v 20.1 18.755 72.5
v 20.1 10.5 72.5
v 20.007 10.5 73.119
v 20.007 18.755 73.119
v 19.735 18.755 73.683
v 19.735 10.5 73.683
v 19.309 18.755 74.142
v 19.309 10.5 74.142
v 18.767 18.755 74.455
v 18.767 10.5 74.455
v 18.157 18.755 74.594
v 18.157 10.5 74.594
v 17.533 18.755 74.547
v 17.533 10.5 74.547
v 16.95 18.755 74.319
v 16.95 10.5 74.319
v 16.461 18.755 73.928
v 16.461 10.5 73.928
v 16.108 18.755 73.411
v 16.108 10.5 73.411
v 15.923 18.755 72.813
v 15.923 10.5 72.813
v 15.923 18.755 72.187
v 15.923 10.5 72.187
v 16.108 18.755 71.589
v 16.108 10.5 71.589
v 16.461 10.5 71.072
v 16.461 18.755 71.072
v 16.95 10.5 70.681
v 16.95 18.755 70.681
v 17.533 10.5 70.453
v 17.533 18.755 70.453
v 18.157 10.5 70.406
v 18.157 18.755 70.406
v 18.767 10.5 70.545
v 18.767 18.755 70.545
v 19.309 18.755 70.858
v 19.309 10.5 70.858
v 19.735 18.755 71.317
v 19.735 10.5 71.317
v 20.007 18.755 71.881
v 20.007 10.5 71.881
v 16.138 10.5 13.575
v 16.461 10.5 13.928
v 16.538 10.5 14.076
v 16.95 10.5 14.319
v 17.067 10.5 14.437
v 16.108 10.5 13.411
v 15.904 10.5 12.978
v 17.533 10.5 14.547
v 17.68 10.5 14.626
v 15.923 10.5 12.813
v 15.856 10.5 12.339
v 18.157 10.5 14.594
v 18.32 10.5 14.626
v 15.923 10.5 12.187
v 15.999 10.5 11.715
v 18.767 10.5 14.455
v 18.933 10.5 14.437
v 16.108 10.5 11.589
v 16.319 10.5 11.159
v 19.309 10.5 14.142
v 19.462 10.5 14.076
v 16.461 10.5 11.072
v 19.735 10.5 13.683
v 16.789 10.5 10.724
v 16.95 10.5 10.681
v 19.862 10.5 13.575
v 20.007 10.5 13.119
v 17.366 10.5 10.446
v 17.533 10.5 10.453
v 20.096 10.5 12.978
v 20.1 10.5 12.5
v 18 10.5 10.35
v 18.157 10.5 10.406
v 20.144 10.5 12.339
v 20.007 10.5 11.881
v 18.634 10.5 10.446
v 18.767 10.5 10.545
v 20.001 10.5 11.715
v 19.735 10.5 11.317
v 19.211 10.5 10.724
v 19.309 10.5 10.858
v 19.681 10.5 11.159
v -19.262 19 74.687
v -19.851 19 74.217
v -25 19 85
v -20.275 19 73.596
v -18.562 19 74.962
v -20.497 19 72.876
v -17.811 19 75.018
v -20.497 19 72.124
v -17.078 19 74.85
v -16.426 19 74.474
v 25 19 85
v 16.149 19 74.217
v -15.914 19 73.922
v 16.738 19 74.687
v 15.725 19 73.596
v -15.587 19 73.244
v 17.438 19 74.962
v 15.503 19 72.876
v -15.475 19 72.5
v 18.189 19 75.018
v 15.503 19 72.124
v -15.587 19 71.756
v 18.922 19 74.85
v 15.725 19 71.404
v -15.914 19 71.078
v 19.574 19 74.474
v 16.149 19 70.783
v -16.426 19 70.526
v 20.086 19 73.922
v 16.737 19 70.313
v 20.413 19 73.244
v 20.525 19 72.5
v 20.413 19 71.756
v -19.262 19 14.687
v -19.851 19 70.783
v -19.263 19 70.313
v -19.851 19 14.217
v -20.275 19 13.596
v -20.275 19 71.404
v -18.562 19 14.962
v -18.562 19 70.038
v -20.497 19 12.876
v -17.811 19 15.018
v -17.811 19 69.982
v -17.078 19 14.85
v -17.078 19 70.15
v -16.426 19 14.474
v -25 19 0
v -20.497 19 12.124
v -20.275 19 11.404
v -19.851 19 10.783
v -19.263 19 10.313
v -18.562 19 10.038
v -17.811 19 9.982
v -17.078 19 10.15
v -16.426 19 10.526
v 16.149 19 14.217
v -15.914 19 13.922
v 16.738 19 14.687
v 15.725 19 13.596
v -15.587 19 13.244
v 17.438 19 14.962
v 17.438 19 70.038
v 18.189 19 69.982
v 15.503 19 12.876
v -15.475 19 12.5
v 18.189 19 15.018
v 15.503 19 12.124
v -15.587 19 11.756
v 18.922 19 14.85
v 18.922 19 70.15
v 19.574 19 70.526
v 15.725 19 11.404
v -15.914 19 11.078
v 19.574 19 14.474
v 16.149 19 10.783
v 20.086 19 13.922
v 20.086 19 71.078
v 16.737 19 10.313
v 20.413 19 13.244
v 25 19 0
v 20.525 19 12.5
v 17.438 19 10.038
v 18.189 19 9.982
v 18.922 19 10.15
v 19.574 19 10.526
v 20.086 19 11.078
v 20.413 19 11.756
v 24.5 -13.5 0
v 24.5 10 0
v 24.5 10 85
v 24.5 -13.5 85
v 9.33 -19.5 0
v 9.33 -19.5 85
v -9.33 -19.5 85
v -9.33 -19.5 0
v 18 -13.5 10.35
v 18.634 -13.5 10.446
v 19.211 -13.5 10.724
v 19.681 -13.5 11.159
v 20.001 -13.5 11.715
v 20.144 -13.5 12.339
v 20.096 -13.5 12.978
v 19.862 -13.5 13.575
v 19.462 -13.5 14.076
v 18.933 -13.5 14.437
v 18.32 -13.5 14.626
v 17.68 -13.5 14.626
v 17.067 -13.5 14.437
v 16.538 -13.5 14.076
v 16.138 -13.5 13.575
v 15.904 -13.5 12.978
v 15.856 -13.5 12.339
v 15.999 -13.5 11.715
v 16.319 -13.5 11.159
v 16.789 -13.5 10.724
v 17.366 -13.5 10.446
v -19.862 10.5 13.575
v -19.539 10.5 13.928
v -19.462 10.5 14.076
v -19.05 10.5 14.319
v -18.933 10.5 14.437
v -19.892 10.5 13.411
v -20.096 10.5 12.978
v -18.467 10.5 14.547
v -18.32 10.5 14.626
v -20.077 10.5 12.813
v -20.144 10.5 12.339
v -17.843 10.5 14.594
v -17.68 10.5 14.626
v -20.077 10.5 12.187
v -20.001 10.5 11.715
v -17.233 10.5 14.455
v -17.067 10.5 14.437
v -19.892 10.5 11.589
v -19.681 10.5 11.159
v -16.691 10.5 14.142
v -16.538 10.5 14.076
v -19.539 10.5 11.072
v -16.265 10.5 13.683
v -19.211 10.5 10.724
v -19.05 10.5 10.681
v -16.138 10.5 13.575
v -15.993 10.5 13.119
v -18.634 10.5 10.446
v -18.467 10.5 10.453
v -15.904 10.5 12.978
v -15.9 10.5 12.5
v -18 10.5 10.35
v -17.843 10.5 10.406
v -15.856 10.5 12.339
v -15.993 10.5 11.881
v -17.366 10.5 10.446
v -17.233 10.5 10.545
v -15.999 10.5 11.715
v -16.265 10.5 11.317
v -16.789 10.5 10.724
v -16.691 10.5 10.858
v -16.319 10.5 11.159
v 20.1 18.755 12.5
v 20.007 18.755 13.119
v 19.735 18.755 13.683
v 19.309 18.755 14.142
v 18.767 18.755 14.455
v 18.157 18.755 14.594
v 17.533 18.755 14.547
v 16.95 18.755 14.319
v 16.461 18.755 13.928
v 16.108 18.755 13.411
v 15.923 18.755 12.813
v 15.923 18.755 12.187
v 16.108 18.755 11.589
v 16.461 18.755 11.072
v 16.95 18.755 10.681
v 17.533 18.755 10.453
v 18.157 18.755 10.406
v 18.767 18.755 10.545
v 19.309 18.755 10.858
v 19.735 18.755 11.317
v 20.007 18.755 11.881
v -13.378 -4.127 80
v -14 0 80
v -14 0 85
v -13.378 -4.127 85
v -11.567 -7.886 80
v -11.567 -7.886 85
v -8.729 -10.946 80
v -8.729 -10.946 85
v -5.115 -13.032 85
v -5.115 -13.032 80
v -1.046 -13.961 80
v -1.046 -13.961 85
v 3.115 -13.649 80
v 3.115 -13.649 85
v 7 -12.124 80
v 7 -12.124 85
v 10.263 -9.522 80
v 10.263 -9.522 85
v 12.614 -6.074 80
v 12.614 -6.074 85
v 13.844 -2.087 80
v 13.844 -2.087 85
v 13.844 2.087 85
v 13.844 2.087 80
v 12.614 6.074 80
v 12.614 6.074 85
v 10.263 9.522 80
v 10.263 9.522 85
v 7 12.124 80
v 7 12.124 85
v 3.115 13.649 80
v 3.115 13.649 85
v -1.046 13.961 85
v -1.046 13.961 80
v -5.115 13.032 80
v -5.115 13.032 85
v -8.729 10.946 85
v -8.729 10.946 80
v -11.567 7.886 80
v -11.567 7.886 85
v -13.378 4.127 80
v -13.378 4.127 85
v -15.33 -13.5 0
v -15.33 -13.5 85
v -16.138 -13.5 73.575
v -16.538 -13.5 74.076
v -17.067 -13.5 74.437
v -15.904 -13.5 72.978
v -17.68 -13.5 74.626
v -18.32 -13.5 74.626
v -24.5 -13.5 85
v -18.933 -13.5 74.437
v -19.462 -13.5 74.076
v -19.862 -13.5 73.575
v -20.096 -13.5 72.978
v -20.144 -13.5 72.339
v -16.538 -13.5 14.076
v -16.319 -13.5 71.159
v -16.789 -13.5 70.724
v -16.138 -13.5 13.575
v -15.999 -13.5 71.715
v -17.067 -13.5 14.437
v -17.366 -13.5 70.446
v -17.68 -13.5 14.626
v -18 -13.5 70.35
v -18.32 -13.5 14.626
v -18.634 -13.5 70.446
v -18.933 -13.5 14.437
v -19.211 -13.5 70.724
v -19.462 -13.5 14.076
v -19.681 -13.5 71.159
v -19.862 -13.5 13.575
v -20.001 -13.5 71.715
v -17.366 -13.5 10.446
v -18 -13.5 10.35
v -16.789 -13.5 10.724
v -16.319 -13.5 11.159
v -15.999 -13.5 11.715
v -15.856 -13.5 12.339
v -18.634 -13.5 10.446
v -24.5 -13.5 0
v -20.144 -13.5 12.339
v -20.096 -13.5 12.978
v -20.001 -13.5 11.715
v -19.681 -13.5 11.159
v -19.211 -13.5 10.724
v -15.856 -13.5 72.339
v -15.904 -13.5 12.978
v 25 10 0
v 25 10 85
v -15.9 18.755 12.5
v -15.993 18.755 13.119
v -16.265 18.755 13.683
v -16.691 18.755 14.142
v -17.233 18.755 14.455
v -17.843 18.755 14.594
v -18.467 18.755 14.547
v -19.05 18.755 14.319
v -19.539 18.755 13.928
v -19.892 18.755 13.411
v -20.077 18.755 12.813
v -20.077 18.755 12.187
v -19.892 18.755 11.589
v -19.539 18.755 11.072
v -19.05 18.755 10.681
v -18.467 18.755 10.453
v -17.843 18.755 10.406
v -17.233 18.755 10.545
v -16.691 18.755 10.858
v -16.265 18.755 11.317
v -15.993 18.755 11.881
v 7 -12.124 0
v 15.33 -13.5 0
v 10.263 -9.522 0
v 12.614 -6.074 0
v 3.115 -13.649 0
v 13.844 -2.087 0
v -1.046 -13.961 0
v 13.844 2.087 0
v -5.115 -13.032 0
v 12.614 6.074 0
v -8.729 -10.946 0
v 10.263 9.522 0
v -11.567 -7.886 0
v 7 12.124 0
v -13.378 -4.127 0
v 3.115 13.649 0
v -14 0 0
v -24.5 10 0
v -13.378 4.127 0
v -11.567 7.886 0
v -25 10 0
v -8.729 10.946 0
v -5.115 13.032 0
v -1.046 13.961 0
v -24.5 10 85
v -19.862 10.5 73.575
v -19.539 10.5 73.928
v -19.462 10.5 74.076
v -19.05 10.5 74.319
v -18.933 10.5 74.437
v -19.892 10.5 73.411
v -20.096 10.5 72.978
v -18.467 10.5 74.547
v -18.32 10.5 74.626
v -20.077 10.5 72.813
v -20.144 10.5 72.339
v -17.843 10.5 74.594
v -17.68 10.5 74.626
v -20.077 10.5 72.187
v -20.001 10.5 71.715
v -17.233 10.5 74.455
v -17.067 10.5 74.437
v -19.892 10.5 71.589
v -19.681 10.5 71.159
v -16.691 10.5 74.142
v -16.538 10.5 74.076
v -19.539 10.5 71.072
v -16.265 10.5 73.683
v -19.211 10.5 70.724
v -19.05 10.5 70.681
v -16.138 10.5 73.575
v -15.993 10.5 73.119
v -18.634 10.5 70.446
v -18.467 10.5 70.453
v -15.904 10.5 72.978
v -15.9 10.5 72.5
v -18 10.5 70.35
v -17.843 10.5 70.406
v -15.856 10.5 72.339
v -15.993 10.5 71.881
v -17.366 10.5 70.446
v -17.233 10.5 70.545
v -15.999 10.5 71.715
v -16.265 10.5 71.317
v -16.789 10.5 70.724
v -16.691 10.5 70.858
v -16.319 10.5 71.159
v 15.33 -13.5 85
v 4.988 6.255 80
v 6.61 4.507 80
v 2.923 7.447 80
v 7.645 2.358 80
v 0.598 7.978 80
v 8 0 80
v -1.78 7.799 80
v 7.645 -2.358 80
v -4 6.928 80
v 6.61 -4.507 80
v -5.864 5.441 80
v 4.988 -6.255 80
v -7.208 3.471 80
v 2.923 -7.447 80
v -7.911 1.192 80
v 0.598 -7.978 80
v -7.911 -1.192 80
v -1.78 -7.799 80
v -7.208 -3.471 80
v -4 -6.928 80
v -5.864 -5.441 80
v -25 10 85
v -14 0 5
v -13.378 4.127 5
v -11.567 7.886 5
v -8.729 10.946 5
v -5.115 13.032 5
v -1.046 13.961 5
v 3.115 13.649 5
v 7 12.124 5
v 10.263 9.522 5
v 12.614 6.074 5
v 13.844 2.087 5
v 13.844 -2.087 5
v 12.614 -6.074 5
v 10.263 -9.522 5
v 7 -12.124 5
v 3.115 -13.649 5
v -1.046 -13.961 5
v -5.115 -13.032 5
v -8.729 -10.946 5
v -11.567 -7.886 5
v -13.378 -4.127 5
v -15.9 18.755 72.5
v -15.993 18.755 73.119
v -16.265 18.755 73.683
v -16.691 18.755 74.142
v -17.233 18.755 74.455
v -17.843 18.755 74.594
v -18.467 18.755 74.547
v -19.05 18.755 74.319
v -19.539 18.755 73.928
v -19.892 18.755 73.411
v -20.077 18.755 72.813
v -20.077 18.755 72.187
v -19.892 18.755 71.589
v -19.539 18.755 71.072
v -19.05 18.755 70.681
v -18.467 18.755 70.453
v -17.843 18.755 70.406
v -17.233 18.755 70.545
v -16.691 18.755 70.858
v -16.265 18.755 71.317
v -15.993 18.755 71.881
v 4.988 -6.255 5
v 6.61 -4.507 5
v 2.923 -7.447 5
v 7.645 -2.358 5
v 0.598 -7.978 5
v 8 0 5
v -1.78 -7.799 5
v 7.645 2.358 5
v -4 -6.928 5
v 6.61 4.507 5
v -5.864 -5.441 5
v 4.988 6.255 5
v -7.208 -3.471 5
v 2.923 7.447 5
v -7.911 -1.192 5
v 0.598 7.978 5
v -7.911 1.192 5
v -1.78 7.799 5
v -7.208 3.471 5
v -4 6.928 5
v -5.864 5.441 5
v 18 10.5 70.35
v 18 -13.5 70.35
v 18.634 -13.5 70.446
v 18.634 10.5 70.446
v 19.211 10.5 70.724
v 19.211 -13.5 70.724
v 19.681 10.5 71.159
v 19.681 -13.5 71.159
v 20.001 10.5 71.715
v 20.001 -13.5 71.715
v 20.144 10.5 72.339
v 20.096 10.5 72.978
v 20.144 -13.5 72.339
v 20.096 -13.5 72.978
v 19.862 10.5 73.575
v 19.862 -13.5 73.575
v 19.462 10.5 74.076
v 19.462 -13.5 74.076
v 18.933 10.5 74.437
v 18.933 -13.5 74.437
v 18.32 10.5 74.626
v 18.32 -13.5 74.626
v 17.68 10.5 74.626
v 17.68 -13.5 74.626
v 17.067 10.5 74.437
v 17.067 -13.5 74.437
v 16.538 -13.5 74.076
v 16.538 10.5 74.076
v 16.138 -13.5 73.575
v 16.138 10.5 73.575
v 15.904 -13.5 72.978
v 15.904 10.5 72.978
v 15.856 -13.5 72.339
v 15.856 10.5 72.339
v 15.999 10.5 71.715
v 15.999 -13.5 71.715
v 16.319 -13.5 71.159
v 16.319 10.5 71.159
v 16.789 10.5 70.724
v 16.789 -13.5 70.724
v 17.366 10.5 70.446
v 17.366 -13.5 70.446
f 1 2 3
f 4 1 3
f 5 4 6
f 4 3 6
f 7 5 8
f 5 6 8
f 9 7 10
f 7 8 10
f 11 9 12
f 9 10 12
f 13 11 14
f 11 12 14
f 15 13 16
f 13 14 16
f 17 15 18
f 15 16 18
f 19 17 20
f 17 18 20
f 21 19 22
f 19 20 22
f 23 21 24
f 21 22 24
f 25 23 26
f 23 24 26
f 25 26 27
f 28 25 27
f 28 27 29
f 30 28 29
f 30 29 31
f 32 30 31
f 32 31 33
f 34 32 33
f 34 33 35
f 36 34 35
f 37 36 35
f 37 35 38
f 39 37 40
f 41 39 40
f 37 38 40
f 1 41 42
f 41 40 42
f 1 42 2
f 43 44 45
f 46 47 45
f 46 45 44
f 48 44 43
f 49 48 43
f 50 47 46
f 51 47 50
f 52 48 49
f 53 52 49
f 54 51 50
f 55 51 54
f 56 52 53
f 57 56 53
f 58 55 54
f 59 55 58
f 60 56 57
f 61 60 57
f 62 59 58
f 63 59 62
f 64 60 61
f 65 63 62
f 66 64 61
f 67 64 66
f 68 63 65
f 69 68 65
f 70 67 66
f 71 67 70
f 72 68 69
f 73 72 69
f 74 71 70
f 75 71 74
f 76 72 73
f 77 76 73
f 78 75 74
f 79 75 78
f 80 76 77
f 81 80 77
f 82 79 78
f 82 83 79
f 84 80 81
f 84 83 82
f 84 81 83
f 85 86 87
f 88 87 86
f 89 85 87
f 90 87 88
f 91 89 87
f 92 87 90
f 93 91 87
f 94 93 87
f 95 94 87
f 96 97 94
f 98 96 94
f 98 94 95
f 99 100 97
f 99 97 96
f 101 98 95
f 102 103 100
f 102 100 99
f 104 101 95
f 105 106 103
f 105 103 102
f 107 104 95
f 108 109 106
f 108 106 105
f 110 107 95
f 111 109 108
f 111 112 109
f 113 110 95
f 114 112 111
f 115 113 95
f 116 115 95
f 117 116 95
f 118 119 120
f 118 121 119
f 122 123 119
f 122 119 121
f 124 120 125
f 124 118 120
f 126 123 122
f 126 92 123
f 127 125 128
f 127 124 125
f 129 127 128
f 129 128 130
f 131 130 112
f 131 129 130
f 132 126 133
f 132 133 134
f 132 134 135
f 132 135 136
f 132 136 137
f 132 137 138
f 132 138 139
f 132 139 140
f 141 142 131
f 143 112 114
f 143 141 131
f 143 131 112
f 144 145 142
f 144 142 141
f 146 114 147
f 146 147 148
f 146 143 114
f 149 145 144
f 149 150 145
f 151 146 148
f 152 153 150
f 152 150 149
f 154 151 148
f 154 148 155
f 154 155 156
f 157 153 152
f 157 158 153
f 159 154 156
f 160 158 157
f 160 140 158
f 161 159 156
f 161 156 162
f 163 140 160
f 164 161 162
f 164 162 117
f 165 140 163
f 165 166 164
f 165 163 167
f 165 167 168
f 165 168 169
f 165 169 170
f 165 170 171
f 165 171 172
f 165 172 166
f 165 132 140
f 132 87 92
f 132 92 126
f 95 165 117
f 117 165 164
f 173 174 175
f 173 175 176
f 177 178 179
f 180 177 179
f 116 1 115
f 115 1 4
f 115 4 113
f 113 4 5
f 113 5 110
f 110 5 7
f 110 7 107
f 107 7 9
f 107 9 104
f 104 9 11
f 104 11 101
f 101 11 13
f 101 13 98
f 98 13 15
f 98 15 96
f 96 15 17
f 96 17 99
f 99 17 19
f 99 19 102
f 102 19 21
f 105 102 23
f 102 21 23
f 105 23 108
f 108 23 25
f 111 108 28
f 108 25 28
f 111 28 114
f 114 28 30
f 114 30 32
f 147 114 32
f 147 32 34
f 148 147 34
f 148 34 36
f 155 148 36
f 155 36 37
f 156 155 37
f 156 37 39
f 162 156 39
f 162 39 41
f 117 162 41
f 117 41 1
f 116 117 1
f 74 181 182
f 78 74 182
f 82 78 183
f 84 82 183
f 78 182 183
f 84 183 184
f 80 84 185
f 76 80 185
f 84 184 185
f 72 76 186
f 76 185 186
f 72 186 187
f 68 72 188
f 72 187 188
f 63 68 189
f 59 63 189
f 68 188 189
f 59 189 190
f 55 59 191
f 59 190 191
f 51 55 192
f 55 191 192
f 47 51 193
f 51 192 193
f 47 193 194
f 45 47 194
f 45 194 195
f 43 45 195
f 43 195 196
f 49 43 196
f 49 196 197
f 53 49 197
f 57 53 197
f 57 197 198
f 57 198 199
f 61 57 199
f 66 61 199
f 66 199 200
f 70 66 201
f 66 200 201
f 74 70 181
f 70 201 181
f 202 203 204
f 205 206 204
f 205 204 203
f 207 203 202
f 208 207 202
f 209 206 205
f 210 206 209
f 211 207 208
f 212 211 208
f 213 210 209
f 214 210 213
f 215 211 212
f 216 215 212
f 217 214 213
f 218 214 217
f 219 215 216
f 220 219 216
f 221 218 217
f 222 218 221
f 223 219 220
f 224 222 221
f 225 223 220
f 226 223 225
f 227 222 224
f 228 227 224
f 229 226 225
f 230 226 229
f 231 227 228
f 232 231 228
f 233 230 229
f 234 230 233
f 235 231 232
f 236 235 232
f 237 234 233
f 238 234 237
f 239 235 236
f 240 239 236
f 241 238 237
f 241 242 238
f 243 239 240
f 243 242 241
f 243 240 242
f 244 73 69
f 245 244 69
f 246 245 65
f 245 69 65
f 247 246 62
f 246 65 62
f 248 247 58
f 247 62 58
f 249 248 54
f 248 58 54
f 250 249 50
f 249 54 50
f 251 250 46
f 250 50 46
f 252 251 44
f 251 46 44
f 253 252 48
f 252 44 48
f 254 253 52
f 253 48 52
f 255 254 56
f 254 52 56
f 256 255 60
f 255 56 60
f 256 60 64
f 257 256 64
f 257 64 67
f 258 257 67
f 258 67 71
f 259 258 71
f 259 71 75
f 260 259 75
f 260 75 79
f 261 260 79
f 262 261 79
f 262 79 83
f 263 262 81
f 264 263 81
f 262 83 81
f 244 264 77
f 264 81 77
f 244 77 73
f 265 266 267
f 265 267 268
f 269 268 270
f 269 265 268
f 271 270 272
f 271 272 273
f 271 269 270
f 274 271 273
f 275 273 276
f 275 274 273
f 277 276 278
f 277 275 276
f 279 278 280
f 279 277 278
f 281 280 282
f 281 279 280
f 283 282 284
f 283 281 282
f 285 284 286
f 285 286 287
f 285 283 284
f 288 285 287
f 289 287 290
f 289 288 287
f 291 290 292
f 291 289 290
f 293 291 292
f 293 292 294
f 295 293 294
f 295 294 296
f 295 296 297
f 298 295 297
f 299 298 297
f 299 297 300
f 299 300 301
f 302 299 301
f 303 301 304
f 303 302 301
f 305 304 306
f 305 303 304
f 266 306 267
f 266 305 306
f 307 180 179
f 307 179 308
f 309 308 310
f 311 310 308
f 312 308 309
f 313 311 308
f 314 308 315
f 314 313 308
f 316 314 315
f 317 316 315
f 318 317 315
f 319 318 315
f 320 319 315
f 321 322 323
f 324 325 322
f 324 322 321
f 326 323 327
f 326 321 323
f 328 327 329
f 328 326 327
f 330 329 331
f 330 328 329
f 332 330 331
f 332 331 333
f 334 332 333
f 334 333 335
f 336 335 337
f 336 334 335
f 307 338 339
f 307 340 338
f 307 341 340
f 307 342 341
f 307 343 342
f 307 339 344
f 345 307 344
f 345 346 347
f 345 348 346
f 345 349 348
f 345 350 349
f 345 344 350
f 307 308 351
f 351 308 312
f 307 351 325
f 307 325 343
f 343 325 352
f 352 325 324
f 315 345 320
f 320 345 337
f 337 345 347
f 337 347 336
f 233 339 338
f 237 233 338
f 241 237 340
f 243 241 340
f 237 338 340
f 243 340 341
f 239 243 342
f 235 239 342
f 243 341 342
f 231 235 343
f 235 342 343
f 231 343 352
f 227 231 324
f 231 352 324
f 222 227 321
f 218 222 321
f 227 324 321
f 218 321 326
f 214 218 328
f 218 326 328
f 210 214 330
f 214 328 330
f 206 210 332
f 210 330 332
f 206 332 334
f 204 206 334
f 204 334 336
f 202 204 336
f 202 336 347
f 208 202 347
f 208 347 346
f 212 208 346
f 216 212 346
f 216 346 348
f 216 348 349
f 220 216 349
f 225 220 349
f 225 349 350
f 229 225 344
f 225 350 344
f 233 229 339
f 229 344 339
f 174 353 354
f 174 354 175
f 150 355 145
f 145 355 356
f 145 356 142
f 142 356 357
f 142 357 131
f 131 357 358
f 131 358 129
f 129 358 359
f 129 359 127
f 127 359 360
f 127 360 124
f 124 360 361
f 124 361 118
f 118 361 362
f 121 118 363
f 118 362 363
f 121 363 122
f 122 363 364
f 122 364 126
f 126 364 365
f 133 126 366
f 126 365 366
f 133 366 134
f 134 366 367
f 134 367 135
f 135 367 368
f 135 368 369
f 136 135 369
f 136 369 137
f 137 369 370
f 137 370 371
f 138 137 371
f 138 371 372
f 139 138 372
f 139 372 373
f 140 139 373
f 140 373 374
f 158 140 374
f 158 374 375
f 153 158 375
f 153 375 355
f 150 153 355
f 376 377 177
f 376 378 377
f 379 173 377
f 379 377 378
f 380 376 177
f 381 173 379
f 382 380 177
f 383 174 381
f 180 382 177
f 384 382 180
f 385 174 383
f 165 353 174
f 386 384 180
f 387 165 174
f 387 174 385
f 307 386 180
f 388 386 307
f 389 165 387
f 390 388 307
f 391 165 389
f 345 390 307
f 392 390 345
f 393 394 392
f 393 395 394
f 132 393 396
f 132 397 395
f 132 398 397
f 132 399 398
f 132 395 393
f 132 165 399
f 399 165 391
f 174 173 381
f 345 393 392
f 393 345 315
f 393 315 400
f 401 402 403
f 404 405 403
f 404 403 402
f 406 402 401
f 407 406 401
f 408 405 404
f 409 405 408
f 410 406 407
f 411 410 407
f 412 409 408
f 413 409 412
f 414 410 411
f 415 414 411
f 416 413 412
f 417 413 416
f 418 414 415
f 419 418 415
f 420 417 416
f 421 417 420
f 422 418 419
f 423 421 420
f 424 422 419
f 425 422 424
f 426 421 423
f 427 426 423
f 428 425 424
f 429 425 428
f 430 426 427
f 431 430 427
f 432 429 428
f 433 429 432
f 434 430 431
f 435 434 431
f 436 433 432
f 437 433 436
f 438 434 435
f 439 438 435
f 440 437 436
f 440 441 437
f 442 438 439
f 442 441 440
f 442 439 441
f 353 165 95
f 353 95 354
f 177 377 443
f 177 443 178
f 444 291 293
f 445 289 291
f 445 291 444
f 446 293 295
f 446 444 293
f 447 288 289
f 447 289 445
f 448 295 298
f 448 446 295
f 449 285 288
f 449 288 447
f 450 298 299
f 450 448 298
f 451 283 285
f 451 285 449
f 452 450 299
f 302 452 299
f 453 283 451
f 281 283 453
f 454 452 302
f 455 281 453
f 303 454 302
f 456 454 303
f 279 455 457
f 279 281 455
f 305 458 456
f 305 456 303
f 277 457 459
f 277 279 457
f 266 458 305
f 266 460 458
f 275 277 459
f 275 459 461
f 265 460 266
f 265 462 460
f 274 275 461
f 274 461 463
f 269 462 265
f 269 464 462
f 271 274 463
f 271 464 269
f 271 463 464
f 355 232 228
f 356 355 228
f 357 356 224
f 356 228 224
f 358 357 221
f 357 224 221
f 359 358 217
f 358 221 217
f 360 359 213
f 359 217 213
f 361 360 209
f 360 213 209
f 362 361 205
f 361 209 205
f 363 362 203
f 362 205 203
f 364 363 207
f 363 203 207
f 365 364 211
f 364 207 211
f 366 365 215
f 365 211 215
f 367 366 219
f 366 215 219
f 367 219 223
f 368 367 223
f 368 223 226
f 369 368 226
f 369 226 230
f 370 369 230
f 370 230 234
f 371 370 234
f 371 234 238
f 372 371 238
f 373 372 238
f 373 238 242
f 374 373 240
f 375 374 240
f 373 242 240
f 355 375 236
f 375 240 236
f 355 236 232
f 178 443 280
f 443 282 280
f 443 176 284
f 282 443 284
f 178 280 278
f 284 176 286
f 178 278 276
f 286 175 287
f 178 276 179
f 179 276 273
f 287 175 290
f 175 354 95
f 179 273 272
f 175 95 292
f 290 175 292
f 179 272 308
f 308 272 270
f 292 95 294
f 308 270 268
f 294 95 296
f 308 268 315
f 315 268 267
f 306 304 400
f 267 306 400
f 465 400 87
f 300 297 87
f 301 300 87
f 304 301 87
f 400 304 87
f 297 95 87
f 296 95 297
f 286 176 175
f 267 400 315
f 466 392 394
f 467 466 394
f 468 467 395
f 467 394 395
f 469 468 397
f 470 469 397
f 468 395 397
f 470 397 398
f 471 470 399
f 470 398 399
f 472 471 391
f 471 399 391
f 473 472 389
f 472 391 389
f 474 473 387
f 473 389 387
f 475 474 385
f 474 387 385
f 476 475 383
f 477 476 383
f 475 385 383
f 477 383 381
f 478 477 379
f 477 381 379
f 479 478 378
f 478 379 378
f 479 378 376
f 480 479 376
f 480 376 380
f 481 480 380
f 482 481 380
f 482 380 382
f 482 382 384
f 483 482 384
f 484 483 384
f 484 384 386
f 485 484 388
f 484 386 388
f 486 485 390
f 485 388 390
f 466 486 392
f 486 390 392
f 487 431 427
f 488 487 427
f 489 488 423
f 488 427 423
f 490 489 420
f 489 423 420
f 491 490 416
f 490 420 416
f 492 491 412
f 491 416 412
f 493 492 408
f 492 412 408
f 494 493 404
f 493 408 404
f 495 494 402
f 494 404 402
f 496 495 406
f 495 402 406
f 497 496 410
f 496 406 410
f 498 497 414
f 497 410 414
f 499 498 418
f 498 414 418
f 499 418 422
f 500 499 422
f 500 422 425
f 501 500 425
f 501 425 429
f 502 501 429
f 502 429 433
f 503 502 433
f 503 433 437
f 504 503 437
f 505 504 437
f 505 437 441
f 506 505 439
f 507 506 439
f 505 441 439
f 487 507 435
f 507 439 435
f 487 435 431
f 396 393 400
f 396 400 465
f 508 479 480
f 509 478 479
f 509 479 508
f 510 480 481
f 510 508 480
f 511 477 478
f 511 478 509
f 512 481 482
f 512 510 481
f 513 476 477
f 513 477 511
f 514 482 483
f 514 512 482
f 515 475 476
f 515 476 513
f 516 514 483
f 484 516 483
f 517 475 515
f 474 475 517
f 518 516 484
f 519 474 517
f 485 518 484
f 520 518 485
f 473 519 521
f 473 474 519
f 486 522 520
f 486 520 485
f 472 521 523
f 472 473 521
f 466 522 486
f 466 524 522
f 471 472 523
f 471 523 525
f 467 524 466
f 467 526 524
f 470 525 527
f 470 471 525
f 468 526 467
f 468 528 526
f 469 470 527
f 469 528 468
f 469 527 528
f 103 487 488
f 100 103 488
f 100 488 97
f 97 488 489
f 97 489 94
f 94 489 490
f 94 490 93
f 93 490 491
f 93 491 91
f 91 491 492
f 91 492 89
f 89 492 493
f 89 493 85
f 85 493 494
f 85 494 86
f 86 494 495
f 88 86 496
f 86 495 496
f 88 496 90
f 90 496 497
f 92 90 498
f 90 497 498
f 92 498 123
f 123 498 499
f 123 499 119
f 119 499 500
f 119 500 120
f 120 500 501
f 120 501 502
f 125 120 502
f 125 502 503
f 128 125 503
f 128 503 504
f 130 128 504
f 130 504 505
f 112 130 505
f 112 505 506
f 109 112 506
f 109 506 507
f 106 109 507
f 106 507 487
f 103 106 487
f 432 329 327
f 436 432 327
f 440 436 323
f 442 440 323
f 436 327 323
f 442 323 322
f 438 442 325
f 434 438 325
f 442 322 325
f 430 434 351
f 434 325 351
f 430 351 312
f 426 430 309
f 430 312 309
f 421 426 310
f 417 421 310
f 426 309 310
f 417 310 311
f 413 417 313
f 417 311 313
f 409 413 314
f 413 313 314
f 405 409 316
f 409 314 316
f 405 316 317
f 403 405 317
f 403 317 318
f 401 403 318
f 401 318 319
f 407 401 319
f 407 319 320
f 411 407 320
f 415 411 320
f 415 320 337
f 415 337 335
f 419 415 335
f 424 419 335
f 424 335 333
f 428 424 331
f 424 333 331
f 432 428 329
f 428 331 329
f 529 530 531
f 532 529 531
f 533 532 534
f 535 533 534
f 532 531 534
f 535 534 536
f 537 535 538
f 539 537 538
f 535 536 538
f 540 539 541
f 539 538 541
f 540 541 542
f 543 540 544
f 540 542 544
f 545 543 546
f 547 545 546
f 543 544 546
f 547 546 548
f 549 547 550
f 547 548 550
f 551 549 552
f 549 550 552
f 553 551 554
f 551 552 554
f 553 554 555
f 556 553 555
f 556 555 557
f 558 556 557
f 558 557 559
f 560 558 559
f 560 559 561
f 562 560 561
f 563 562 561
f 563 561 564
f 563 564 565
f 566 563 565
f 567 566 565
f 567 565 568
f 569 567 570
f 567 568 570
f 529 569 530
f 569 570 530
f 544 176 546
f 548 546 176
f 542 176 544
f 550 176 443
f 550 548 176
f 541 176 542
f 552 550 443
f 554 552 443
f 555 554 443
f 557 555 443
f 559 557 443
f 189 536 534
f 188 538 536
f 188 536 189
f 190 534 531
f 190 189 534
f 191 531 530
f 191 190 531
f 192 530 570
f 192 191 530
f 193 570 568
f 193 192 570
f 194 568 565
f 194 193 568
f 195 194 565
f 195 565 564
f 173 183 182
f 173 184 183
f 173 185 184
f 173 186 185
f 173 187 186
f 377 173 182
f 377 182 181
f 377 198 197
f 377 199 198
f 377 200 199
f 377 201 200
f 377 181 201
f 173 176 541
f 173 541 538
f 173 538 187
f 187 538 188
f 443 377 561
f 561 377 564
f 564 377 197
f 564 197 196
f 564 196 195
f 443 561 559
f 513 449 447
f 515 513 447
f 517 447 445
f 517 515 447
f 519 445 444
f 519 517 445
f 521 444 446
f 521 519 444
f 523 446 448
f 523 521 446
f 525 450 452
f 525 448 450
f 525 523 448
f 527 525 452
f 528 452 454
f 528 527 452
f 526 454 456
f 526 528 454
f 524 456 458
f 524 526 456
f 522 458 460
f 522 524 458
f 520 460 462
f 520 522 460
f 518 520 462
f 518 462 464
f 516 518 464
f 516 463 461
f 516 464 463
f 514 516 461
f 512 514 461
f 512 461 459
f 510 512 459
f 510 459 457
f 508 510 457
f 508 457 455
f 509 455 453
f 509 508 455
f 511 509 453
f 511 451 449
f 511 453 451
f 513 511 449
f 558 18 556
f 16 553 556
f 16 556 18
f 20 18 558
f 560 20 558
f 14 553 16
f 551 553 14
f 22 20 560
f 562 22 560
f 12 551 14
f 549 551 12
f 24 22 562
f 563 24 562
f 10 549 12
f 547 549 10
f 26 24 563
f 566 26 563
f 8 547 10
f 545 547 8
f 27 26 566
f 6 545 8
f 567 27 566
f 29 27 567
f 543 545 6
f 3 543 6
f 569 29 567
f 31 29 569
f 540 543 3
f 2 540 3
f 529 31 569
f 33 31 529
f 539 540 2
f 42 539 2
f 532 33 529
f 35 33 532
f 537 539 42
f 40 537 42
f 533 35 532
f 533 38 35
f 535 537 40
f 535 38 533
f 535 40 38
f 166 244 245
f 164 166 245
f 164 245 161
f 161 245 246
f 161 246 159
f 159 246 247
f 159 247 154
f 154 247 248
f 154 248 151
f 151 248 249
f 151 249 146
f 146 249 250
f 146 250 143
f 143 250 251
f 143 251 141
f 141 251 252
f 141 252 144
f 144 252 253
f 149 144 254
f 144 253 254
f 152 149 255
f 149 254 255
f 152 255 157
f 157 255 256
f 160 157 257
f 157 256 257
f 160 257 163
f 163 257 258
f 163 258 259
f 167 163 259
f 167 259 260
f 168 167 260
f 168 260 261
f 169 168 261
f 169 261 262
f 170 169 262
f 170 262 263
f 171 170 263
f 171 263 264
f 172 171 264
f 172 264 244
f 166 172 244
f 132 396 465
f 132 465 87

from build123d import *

# Parameters (mm, degrees)
SKETCH_1_R                  = 8
EXTRUDE_1_DEPTH             = 85
SKETCH_2_R                  = 1
CUT_EXTRUDE_1_DEPTH         = 97.603571363
HOLE_WIZARD_M51_D           = 4.2
HOLE_WIZARD_M51_DEPTH       = 14
HOLE_WIZARD_M51_CSINK_D     = 5.05
HOLE_WIZARD_M51_CSINK_ANGLE = 120
HOLE_WIZARD_M51_TIP         = 1.2618073
SKETCH_6_R                  = 2.15
CUT_EXTRUDE_3_DEPTH         = 24
SKETCH_7_R                  = 14
CUT_EXTRUDE_4_DEPTH         = 5
CUT_EXTRUDE_START           = -5
SKETCH_8_R                  = 14
CUT_EXTRUDE_5_DEPTH         = 5


with BuildPart() as part:
    # Эскиз1 → Бобышка-Вытянуть1 (new body)
    with BuildSketch(Plane.XY):
        Polygon((-25, 19), (25, 19), (25, 10), (24.5, 10), (24.5, -13.5), (15.329639, -13.5), (9.329639, -19.5), (-9.329639, -19.5), (-15.329639, -13.5), (-24.5, -13.5), (-24.5, 10), (-25, 10), align=None)
        Circle(SKETCH_1_R, mode=Mode.SUBTRACT)
    extrude(amount=EXTRUDE_1_DEPTH)

    # Эскиз2 → Вырез-Вытянуть1 (cut, through all)
    with BuildSketch(Plane(origin=(0, 19, 0), x_dir=(1, 0, 0), z_dir=(0, 1, 0))):
        with Locations(Location((-18, -12.5, 0), (0, 0, 270))):
            Circle(SKETCH_2_R)
        with Locations(Location((-18, -72.5, 0), (0, 0, 270))):
            Circle(SKETCH_2_R)
        with Locations(Location((18, -72.5, 0), (0, 0, 270))):
            Circle(SKETCH_2_R)
        with Locations(Location((18, -12.5, 0), (0, 0, 270))):
            Circle(SKETCH_2_R)
    extrude(amount=-CUT_EXTRUDE_1_DEPTH, mode=Mode.SUBTRACT)

    # Отверстие обработанное метчиком M51
    with Locations(Plane(origin=(0, 19, 0), x_dir=(-1, 0, 0), z_dir=(0, 1, 0))):
        with Locations((-18, 12.5), (-18, 72.5), (18, 72.5), (18, 12.5)):
            CounterSinkHole(HOLE_WIZARD_M51_D / 2, HOLE_WIZARD_M51_CSINK_D / 2, depth=HOLE_WIZARD_M51_DEPTH, counter_sink_angle=HOLE_WIZARD_M51_CSINK_ANGLE)
            with Locations((0, 0, -(HOLE_WIZARD_M51_DEPTH + HOLE_WIZARD_M51_TIP / 2))):  # 118° drill point
                Cone(0, HOLE_WIZARD_M51_D / 2, HOLE_WIZARD_M51_TIP, mode=Mode.SUBTRACT)

    # Эскиз6 → Вырез-Вытянуть3 (cut)
    with BuildSketch(Plane.XZ.offset(13.5)):
        with Locations(Location((-18, 72.5, 0), (0, 0, 270))):
            Circle(SKETCH_6_R)
        with Locations(Location((18, 72.5, 0), (0, 0, 270))):
            Circle(SKETCH_6_R)
        with Locations(Location((18, 12.5, 0), (0, 0, 270))):
            Circle(SKETCH_6_R)
        with Locations(Location((-18, 12.5, 0), (0, 0, 270))):
            Circle(SKETCH_6_R)
    extrude(amount=-CUT_EXTRUDE_3_DEPTH, mode=Mode.SUBTRACT)

    # Эскиз7 → Вырез-Вытянуть4 (cut)
    with BuildSketch(Plane(origin=(0, 0, 0), x_dir=(-1, 0, 0), z_dir=(0, 0, -1))):
        Circle(SKETCH_7_R)
    extrude(amount=-CUT_EXTRUDE_4_DEPTH, mode=Mode.SUBTRACT)

    # Эскиз8 → Вырез-Вытянуть5 (cut)
    with BuildSketch(Plane.XY.offset(85).offset(CUT_EXTRUDE_START)):
        with Locations(Location((0, 0, 0), (0, 0, 180))):
            Circle(SKETCH_8_R)
    extrude(amount=CUT_EXTRUDE_5_DEPTH, mode=Mode.SUBTRACT)


solid = part.part
